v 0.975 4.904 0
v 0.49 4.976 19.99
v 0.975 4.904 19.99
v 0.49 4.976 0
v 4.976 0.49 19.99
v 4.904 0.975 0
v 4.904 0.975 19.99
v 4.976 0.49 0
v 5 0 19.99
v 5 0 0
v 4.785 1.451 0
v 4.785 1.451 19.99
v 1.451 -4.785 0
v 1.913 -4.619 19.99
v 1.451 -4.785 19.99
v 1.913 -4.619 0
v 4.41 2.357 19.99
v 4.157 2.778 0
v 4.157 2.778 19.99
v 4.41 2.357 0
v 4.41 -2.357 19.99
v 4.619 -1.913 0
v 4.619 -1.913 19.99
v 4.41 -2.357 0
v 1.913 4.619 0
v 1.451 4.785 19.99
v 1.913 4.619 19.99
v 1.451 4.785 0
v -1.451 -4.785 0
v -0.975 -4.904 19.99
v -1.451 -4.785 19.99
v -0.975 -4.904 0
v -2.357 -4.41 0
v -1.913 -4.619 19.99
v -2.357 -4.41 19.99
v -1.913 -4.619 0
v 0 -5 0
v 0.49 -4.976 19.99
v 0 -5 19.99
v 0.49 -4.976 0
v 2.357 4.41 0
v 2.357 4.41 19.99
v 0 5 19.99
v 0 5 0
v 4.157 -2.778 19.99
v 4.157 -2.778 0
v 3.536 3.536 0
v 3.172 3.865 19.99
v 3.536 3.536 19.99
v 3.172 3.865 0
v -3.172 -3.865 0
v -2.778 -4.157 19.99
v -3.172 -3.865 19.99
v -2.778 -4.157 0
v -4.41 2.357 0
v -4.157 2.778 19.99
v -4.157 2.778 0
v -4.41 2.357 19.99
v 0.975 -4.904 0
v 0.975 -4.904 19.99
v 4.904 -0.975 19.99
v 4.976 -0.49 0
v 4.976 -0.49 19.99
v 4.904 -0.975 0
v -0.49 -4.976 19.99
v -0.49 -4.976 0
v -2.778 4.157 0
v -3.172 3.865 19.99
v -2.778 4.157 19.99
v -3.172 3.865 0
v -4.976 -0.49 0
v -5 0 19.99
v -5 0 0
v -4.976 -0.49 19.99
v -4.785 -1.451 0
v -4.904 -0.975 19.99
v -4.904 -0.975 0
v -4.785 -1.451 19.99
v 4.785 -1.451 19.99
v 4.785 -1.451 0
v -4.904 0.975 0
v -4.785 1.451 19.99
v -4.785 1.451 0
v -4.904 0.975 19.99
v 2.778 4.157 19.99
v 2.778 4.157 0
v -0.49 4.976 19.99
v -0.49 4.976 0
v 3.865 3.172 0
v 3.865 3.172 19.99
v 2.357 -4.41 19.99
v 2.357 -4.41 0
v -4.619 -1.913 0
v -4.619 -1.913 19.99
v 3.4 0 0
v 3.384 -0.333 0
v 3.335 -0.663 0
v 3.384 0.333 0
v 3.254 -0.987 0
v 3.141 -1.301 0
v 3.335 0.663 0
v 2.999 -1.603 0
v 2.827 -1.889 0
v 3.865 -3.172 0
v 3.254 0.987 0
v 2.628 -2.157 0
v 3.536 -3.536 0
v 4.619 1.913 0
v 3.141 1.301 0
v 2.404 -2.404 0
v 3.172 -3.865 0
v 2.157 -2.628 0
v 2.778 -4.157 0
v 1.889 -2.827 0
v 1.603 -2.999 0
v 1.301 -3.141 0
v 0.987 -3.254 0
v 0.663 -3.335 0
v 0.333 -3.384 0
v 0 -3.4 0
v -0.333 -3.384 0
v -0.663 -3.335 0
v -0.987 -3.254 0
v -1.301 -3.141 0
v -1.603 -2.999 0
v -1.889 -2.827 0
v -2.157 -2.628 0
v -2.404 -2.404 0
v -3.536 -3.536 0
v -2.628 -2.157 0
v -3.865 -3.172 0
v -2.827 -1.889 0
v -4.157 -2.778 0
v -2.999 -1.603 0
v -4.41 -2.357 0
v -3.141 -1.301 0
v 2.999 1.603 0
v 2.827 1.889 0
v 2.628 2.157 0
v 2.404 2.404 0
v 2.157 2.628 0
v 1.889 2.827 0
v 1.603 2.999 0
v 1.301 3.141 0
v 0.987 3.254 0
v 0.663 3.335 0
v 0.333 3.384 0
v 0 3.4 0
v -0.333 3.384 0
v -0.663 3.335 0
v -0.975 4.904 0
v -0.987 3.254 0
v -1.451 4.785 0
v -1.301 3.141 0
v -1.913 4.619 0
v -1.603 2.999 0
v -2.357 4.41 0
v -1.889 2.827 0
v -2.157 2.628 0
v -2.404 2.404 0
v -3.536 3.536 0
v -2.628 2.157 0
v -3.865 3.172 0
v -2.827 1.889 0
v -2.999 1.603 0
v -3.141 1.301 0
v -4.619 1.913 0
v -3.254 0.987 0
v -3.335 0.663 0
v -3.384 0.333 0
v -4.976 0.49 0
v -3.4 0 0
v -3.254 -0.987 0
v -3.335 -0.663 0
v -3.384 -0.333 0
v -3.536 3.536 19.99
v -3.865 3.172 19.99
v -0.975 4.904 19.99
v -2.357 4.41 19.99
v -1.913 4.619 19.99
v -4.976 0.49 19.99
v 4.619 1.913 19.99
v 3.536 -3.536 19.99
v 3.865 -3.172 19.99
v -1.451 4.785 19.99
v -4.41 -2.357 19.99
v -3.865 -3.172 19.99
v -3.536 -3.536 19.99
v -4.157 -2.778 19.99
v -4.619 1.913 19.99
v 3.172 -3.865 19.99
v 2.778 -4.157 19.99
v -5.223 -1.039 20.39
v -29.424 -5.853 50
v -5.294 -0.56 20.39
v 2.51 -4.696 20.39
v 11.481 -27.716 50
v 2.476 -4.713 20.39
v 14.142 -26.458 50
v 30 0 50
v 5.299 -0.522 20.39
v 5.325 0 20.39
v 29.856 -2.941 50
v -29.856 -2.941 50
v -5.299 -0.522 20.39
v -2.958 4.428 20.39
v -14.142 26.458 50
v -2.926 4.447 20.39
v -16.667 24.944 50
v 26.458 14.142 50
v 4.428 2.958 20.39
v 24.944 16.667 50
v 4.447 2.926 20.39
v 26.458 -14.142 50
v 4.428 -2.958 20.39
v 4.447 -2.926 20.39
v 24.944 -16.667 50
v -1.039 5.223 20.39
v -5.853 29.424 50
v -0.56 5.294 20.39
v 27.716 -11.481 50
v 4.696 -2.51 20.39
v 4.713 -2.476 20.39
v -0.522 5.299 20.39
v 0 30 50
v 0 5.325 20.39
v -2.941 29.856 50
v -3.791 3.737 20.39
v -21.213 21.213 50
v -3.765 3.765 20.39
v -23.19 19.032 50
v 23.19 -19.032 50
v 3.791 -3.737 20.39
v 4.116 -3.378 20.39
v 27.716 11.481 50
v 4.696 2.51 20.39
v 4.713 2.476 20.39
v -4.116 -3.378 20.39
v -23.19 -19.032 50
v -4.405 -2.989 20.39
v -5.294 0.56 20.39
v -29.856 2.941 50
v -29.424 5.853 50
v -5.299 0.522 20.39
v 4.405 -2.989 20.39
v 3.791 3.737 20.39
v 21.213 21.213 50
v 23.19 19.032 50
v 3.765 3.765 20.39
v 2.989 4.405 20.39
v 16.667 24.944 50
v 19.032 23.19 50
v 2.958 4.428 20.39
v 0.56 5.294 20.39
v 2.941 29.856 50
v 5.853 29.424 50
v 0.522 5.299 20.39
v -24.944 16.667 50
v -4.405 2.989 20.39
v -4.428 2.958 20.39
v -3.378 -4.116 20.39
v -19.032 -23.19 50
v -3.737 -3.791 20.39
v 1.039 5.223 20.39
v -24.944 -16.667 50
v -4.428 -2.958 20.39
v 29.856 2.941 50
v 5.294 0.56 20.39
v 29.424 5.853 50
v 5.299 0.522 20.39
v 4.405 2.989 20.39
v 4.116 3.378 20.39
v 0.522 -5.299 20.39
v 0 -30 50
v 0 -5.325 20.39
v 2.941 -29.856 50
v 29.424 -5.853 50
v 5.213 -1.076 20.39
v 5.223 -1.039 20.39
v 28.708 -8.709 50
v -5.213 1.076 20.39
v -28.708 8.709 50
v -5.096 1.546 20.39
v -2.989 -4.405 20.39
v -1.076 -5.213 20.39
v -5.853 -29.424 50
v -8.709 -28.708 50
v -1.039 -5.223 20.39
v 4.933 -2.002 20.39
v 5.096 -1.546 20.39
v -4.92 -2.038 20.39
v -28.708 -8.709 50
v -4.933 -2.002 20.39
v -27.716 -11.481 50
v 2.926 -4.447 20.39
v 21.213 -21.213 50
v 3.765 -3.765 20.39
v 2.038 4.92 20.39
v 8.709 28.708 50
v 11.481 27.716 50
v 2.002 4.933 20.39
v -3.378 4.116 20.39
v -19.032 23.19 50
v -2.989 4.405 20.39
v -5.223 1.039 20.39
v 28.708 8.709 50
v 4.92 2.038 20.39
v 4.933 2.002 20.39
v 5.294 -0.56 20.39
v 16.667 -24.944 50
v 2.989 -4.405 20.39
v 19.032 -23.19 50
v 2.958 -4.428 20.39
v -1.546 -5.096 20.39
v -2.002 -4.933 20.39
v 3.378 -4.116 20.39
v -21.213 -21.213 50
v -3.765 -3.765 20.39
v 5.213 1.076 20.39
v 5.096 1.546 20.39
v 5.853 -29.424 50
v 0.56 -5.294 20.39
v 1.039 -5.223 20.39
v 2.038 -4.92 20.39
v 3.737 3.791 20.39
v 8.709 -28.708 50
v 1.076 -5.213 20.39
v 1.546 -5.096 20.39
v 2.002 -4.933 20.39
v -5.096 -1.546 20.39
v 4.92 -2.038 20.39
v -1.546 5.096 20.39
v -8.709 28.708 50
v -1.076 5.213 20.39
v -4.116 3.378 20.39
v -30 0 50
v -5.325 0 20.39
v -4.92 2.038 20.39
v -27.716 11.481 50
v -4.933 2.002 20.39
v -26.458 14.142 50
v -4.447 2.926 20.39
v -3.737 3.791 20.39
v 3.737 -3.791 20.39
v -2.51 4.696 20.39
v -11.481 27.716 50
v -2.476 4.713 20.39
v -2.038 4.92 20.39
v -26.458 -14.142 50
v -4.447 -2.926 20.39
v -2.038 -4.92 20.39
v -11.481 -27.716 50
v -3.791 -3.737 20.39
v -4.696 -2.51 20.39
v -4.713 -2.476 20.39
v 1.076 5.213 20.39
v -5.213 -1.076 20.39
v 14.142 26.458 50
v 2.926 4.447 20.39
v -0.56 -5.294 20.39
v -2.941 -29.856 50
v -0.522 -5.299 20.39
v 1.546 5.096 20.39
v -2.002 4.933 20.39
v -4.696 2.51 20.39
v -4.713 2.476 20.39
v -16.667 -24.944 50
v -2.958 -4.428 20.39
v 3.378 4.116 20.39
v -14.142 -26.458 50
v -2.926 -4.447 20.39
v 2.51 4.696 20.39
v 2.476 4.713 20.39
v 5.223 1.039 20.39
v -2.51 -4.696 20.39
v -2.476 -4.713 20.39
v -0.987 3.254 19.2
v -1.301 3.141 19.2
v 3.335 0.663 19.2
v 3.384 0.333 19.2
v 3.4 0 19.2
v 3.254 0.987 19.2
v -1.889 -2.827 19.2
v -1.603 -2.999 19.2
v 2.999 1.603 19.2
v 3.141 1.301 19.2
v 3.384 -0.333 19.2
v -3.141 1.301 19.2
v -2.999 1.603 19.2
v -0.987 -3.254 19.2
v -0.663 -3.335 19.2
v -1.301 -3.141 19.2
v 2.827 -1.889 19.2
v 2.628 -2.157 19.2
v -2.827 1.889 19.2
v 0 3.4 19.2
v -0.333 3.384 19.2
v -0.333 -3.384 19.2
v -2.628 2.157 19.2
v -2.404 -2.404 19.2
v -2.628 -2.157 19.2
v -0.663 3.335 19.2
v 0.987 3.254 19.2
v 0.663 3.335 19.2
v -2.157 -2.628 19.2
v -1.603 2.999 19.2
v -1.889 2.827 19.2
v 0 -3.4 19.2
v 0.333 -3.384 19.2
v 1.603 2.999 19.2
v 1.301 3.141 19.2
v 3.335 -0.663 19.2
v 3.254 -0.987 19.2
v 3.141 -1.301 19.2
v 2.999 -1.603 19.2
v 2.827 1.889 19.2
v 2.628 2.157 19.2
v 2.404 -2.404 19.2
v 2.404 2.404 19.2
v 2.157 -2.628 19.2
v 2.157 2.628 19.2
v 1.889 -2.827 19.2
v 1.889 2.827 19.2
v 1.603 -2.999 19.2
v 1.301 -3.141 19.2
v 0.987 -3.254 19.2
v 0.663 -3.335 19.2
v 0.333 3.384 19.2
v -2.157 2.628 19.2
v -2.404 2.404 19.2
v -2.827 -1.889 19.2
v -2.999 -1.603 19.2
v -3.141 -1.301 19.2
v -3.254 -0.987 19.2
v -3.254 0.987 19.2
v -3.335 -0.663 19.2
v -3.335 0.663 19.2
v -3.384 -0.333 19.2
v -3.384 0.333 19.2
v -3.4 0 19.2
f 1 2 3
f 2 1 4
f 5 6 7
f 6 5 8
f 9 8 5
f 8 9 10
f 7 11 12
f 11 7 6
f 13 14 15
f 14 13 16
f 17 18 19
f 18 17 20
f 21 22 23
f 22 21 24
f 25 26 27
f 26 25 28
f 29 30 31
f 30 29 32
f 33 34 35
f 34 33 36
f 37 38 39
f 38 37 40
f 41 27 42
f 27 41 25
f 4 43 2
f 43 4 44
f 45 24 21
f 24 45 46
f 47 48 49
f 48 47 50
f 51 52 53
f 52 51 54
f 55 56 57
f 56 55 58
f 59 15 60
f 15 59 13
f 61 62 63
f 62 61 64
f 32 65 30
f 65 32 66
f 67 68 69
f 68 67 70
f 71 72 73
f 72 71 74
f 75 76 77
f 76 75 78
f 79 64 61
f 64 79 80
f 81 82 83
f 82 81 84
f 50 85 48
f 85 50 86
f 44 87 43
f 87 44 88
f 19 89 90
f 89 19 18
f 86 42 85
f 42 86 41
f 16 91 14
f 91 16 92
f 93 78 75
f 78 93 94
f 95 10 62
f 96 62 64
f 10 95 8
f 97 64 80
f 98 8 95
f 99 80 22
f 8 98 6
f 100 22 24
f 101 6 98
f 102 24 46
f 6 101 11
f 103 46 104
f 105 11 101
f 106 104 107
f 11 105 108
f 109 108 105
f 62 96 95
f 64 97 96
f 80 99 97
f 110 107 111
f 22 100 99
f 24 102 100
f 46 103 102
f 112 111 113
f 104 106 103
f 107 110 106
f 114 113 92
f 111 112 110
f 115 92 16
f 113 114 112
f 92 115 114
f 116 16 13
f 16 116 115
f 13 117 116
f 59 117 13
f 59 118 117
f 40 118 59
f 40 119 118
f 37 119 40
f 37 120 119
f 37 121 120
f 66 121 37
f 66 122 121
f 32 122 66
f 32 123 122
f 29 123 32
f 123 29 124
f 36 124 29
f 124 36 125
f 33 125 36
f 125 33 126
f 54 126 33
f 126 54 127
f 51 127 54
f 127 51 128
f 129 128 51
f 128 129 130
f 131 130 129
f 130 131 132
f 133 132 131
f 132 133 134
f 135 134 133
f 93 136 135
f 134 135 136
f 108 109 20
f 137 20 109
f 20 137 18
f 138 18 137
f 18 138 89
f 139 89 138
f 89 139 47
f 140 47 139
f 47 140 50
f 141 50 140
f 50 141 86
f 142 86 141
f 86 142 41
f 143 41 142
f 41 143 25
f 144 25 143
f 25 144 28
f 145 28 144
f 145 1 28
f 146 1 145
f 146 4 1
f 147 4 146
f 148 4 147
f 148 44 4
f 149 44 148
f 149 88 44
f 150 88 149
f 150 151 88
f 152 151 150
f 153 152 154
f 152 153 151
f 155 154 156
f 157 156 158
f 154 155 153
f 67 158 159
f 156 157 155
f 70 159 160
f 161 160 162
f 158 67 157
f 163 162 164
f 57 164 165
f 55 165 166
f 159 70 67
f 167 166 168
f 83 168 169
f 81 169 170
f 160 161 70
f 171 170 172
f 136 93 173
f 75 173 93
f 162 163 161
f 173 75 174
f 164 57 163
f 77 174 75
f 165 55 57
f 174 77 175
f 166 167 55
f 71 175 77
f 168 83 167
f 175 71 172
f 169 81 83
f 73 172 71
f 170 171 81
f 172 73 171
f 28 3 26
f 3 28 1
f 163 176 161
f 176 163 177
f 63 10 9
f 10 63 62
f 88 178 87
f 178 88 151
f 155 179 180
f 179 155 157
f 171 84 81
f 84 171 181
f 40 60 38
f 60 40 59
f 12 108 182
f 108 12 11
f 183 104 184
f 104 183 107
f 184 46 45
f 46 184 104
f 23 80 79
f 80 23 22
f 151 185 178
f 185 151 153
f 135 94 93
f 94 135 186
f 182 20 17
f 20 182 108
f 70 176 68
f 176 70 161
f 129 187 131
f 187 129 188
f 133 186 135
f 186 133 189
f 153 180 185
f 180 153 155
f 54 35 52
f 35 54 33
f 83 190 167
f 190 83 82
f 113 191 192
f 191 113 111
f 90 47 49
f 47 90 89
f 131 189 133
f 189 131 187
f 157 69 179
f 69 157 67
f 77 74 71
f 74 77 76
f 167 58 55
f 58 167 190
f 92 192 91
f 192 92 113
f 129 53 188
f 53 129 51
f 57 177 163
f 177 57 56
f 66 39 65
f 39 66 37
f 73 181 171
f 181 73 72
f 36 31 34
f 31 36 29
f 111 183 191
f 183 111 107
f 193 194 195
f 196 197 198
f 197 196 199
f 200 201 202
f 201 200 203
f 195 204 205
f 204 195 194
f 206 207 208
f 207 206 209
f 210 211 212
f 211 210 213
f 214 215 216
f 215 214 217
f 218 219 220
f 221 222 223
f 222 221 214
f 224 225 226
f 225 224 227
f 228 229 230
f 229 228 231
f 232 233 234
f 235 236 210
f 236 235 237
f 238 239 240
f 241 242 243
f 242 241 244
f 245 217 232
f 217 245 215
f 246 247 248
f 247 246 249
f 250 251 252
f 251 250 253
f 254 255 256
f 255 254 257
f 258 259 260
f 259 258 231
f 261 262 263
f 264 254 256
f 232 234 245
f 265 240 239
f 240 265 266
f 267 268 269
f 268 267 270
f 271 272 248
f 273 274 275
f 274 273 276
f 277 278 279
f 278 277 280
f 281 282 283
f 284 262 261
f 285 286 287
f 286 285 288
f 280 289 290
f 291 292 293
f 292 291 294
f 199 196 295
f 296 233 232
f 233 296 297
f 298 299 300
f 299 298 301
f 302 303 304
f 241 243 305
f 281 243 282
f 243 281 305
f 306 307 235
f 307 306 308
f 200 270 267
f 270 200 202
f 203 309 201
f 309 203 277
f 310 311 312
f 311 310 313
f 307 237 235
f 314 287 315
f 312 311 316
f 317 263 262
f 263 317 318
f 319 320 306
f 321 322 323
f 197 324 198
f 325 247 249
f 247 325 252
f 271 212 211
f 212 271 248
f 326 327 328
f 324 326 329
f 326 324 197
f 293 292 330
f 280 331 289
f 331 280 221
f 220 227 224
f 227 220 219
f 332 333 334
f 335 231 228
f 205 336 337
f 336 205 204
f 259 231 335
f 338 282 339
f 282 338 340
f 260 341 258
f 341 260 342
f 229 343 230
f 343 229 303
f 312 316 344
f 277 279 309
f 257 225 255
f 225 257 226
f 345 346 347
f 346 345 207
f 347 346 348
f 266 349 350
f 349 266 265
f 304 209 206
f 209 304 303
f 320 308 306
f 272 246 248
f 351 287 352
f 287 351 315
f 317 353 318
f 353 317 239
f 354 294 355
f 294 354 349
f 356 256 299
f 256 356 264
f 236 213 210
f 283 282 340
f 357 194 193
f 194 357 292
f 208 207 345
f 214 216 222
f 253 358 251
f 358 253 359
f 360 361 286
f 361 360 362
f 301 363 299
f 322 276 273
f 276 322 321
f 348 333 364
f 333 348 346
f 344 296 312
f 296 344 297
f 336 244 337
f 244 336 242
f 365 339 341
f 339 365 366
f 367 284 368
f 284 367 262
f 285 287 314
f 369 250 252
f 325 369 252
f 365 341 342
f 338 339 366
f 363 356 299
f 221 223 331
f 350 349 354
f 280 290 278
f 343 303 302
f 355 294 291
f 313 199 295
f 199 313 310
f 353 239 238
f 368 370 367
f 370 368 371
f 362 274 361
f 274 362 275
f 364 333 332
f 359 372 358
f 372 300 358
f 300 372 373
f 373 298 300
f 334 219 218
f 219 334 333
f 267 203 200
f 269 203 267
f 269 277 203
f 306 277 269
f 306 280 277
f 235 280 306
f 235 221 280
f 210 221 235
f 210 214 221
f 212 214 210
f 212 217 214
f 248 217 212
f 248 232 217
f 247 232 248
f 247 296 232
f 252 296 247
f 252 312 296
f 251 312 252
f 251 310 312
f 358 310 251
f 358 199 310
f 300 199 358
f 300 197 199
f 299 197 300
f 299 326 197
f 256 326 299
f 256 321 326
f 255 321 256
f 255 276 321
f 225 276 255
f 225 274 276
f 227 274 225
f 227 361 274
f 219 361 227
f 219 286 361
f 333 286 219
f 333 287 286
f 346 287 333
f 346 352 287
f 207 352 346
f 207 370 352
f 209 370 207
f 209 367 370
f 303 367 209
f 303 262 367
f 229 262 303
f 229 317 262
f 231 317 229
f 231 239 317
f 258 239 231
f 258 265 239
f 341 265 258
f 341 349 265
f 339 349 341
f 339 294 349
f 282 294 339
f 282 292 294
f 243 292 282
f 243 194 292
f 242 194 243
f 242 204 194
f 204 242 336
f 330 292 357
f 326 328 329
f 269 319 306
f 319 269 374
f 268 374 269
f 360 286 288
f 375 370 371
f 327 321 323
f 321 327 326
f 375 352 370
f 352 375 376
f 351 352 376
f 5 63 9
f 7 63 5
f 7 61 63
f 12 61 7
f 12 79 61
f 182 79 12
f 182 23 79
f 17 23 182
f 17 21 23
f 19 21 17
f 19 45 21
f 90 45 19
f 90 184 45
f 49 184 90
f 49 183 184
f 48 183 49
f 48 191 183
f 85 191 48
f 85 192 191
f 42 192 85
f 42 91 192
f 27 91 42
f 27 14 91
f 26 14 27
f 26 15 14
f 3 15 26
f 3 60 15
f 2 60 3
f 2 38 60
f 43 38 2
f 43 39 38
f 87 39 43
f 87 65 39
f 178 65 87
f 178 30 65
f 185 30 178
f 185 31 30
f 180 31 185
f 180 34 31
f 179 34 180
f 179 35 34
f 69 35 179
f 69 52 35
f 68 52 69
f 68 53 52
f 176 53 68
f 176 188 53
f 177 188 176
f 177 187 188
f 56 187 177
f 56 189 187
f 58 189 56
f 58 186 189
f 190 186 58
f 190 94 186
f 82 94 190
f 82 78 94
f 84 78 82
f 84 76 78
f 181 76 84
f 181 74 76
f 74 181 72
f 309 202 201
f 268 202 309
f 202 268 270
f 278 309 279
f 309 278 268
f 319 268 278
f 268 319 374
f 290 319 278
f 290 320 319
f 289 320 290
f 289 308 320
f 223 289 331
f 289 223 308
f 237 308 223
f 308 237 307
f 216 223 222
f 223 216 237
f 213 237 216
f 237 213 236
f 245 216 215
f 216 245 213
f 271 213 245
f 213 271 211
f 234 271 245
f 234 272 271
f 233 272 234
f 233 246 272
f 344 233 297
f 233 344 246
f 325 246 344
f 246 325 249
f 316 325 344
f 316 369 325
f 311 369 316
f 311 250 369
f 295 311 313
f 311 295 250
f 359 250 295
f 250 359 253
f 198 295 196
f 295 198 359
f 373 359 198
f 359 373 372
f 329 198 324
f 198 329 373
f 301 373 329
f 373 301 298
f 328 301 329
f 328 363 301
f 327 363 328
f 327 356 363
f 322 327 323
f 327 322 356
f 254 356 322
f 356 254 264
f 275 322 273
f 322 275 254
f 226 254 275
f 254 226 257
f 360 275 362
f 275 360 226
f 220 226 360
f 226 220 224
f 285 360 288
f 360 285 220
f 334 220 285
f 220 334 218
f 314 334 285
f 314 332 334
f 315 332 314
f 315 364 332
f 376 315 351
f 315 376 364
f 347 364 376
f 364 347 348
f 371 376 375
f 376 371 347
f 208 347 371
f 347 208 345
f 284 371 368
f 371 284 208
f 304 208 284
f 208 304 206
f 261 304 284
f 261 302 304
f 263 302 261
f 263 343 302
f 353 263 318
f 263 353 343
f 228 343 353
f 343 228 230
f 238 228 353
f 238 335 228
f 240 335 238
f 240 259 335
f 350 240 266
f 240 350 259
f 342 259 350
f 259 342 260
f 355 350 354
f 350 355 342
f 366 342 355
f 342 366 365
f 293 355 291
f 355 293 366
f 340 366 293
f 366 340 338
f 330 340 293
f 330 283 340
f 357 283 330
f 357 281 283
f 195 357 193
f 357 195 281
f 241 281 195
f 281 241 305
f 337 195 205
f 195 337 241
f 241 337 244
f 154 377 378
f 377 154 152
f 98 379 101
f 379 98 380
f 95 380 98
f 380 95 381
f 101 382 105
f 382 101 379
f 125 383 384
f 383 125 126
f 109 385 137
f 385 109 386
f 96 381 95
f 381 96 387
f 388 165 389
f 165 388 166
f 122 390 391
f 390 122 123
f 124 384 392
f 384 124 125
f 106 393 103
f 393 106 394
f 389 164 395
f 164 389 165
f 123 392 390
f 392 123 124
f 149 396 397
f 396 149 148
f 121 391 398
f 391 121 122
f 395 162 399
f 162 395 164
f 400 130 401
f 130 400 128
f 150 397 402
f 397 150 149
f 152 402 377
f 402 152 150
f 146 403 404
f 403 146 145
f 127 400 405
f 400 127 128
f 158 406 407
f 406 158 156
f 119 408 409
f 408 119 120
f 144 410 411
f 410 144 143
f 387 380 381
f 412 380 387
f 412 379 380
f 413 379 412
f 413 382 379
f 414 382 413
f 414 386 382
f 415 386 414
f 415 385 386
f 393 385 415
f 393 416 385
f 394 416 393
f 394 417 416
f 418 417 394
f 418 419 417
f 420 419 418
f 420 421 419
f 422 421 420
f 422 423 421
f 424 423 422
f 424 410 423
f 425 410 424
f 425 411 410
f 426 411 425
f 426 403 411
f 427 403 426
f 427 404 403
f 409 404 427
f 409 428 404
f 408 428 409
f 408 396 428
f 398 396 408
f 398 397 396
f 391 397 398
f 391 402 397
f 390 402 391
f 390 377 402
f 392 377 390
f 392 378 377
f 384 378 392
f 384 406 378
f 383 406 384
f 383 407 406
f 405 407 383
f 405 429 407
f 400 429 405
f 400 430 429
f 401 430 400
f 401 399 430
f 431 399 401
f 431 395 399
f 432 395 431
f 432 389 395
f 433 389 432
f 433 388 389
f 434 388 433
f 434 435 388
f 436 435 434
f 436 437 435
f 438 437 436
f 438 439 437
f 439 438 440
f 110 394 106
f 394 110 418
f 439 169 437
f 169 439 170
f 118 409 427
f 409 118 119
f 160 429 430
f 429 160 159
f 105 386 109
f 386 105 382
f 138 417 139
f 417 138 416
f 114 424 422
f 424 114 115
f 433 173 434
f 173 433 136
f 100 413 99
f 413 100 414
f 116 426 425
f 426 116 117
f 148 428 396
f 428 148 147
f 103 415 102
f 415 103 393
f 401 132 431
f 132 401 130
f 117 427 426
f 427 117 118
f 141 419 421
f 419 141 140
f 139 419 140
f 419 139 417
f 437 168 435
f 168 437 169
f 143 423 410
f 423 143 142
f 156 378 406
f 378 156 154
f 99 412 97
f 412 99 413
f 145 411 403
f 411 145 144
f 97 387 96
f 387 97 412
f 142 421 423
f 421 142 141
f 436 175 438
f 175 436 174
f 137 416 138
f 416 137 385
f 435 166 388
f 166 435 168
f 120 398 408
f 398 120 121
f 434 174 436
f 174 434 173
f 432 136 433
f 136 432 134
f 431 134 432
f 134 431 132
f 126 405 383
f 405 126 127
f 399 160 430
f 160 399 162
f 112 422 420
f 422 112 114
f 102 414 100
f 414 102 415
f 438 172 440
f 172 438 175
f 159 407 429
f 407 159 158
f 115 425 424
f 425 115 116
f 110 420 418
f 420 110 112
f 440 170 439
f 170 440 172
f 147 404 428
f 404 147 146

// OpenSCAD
// Small lab funnel, printed upright with wide opening at top
// Units: mm

$fn = 64;

// --- Dimensions ---
spout_od      = 10;    // spout outer diameter
spout_id      = spout_od - 2 * 1.6;  // spout bore (6.8)
spout_h       = 20;    // spout height (z = 0 to 20)
cone_top_d    = 10;    // cone diameter at z = 20
cone_rim_d    = 60;    // cone rim diameter at z = 50
cone_h        = 30;    // cone height (z = 20 to 50)
wall          = 1.6;   // wall thickness everywhere

total_h = spout_h + cone_h;  // 50 mm

// --- Model ---
difference() {
    union() {
        // Spout (z = 0 to 20)
        cylinder(d = spout_od, h = spout_h);
        // Cone (z = 20 to 50)
        translate([0, 0, spout_h])
            cylinder(d1 = cone_top_d, d2 = cone_rim_d, h = cone_h);
    }
    // Through-bore: spout bore up to cone, then 60 mm hole at rim
    translate([0, 0, spout_h - 0.01])
        cylinder(d = cone_rim_d + 0.8, h = 0.4);   // thin wall above rim
    cylinder(d = spout_id, h = spout_h - 0.8);     // bore ends below cone
}
